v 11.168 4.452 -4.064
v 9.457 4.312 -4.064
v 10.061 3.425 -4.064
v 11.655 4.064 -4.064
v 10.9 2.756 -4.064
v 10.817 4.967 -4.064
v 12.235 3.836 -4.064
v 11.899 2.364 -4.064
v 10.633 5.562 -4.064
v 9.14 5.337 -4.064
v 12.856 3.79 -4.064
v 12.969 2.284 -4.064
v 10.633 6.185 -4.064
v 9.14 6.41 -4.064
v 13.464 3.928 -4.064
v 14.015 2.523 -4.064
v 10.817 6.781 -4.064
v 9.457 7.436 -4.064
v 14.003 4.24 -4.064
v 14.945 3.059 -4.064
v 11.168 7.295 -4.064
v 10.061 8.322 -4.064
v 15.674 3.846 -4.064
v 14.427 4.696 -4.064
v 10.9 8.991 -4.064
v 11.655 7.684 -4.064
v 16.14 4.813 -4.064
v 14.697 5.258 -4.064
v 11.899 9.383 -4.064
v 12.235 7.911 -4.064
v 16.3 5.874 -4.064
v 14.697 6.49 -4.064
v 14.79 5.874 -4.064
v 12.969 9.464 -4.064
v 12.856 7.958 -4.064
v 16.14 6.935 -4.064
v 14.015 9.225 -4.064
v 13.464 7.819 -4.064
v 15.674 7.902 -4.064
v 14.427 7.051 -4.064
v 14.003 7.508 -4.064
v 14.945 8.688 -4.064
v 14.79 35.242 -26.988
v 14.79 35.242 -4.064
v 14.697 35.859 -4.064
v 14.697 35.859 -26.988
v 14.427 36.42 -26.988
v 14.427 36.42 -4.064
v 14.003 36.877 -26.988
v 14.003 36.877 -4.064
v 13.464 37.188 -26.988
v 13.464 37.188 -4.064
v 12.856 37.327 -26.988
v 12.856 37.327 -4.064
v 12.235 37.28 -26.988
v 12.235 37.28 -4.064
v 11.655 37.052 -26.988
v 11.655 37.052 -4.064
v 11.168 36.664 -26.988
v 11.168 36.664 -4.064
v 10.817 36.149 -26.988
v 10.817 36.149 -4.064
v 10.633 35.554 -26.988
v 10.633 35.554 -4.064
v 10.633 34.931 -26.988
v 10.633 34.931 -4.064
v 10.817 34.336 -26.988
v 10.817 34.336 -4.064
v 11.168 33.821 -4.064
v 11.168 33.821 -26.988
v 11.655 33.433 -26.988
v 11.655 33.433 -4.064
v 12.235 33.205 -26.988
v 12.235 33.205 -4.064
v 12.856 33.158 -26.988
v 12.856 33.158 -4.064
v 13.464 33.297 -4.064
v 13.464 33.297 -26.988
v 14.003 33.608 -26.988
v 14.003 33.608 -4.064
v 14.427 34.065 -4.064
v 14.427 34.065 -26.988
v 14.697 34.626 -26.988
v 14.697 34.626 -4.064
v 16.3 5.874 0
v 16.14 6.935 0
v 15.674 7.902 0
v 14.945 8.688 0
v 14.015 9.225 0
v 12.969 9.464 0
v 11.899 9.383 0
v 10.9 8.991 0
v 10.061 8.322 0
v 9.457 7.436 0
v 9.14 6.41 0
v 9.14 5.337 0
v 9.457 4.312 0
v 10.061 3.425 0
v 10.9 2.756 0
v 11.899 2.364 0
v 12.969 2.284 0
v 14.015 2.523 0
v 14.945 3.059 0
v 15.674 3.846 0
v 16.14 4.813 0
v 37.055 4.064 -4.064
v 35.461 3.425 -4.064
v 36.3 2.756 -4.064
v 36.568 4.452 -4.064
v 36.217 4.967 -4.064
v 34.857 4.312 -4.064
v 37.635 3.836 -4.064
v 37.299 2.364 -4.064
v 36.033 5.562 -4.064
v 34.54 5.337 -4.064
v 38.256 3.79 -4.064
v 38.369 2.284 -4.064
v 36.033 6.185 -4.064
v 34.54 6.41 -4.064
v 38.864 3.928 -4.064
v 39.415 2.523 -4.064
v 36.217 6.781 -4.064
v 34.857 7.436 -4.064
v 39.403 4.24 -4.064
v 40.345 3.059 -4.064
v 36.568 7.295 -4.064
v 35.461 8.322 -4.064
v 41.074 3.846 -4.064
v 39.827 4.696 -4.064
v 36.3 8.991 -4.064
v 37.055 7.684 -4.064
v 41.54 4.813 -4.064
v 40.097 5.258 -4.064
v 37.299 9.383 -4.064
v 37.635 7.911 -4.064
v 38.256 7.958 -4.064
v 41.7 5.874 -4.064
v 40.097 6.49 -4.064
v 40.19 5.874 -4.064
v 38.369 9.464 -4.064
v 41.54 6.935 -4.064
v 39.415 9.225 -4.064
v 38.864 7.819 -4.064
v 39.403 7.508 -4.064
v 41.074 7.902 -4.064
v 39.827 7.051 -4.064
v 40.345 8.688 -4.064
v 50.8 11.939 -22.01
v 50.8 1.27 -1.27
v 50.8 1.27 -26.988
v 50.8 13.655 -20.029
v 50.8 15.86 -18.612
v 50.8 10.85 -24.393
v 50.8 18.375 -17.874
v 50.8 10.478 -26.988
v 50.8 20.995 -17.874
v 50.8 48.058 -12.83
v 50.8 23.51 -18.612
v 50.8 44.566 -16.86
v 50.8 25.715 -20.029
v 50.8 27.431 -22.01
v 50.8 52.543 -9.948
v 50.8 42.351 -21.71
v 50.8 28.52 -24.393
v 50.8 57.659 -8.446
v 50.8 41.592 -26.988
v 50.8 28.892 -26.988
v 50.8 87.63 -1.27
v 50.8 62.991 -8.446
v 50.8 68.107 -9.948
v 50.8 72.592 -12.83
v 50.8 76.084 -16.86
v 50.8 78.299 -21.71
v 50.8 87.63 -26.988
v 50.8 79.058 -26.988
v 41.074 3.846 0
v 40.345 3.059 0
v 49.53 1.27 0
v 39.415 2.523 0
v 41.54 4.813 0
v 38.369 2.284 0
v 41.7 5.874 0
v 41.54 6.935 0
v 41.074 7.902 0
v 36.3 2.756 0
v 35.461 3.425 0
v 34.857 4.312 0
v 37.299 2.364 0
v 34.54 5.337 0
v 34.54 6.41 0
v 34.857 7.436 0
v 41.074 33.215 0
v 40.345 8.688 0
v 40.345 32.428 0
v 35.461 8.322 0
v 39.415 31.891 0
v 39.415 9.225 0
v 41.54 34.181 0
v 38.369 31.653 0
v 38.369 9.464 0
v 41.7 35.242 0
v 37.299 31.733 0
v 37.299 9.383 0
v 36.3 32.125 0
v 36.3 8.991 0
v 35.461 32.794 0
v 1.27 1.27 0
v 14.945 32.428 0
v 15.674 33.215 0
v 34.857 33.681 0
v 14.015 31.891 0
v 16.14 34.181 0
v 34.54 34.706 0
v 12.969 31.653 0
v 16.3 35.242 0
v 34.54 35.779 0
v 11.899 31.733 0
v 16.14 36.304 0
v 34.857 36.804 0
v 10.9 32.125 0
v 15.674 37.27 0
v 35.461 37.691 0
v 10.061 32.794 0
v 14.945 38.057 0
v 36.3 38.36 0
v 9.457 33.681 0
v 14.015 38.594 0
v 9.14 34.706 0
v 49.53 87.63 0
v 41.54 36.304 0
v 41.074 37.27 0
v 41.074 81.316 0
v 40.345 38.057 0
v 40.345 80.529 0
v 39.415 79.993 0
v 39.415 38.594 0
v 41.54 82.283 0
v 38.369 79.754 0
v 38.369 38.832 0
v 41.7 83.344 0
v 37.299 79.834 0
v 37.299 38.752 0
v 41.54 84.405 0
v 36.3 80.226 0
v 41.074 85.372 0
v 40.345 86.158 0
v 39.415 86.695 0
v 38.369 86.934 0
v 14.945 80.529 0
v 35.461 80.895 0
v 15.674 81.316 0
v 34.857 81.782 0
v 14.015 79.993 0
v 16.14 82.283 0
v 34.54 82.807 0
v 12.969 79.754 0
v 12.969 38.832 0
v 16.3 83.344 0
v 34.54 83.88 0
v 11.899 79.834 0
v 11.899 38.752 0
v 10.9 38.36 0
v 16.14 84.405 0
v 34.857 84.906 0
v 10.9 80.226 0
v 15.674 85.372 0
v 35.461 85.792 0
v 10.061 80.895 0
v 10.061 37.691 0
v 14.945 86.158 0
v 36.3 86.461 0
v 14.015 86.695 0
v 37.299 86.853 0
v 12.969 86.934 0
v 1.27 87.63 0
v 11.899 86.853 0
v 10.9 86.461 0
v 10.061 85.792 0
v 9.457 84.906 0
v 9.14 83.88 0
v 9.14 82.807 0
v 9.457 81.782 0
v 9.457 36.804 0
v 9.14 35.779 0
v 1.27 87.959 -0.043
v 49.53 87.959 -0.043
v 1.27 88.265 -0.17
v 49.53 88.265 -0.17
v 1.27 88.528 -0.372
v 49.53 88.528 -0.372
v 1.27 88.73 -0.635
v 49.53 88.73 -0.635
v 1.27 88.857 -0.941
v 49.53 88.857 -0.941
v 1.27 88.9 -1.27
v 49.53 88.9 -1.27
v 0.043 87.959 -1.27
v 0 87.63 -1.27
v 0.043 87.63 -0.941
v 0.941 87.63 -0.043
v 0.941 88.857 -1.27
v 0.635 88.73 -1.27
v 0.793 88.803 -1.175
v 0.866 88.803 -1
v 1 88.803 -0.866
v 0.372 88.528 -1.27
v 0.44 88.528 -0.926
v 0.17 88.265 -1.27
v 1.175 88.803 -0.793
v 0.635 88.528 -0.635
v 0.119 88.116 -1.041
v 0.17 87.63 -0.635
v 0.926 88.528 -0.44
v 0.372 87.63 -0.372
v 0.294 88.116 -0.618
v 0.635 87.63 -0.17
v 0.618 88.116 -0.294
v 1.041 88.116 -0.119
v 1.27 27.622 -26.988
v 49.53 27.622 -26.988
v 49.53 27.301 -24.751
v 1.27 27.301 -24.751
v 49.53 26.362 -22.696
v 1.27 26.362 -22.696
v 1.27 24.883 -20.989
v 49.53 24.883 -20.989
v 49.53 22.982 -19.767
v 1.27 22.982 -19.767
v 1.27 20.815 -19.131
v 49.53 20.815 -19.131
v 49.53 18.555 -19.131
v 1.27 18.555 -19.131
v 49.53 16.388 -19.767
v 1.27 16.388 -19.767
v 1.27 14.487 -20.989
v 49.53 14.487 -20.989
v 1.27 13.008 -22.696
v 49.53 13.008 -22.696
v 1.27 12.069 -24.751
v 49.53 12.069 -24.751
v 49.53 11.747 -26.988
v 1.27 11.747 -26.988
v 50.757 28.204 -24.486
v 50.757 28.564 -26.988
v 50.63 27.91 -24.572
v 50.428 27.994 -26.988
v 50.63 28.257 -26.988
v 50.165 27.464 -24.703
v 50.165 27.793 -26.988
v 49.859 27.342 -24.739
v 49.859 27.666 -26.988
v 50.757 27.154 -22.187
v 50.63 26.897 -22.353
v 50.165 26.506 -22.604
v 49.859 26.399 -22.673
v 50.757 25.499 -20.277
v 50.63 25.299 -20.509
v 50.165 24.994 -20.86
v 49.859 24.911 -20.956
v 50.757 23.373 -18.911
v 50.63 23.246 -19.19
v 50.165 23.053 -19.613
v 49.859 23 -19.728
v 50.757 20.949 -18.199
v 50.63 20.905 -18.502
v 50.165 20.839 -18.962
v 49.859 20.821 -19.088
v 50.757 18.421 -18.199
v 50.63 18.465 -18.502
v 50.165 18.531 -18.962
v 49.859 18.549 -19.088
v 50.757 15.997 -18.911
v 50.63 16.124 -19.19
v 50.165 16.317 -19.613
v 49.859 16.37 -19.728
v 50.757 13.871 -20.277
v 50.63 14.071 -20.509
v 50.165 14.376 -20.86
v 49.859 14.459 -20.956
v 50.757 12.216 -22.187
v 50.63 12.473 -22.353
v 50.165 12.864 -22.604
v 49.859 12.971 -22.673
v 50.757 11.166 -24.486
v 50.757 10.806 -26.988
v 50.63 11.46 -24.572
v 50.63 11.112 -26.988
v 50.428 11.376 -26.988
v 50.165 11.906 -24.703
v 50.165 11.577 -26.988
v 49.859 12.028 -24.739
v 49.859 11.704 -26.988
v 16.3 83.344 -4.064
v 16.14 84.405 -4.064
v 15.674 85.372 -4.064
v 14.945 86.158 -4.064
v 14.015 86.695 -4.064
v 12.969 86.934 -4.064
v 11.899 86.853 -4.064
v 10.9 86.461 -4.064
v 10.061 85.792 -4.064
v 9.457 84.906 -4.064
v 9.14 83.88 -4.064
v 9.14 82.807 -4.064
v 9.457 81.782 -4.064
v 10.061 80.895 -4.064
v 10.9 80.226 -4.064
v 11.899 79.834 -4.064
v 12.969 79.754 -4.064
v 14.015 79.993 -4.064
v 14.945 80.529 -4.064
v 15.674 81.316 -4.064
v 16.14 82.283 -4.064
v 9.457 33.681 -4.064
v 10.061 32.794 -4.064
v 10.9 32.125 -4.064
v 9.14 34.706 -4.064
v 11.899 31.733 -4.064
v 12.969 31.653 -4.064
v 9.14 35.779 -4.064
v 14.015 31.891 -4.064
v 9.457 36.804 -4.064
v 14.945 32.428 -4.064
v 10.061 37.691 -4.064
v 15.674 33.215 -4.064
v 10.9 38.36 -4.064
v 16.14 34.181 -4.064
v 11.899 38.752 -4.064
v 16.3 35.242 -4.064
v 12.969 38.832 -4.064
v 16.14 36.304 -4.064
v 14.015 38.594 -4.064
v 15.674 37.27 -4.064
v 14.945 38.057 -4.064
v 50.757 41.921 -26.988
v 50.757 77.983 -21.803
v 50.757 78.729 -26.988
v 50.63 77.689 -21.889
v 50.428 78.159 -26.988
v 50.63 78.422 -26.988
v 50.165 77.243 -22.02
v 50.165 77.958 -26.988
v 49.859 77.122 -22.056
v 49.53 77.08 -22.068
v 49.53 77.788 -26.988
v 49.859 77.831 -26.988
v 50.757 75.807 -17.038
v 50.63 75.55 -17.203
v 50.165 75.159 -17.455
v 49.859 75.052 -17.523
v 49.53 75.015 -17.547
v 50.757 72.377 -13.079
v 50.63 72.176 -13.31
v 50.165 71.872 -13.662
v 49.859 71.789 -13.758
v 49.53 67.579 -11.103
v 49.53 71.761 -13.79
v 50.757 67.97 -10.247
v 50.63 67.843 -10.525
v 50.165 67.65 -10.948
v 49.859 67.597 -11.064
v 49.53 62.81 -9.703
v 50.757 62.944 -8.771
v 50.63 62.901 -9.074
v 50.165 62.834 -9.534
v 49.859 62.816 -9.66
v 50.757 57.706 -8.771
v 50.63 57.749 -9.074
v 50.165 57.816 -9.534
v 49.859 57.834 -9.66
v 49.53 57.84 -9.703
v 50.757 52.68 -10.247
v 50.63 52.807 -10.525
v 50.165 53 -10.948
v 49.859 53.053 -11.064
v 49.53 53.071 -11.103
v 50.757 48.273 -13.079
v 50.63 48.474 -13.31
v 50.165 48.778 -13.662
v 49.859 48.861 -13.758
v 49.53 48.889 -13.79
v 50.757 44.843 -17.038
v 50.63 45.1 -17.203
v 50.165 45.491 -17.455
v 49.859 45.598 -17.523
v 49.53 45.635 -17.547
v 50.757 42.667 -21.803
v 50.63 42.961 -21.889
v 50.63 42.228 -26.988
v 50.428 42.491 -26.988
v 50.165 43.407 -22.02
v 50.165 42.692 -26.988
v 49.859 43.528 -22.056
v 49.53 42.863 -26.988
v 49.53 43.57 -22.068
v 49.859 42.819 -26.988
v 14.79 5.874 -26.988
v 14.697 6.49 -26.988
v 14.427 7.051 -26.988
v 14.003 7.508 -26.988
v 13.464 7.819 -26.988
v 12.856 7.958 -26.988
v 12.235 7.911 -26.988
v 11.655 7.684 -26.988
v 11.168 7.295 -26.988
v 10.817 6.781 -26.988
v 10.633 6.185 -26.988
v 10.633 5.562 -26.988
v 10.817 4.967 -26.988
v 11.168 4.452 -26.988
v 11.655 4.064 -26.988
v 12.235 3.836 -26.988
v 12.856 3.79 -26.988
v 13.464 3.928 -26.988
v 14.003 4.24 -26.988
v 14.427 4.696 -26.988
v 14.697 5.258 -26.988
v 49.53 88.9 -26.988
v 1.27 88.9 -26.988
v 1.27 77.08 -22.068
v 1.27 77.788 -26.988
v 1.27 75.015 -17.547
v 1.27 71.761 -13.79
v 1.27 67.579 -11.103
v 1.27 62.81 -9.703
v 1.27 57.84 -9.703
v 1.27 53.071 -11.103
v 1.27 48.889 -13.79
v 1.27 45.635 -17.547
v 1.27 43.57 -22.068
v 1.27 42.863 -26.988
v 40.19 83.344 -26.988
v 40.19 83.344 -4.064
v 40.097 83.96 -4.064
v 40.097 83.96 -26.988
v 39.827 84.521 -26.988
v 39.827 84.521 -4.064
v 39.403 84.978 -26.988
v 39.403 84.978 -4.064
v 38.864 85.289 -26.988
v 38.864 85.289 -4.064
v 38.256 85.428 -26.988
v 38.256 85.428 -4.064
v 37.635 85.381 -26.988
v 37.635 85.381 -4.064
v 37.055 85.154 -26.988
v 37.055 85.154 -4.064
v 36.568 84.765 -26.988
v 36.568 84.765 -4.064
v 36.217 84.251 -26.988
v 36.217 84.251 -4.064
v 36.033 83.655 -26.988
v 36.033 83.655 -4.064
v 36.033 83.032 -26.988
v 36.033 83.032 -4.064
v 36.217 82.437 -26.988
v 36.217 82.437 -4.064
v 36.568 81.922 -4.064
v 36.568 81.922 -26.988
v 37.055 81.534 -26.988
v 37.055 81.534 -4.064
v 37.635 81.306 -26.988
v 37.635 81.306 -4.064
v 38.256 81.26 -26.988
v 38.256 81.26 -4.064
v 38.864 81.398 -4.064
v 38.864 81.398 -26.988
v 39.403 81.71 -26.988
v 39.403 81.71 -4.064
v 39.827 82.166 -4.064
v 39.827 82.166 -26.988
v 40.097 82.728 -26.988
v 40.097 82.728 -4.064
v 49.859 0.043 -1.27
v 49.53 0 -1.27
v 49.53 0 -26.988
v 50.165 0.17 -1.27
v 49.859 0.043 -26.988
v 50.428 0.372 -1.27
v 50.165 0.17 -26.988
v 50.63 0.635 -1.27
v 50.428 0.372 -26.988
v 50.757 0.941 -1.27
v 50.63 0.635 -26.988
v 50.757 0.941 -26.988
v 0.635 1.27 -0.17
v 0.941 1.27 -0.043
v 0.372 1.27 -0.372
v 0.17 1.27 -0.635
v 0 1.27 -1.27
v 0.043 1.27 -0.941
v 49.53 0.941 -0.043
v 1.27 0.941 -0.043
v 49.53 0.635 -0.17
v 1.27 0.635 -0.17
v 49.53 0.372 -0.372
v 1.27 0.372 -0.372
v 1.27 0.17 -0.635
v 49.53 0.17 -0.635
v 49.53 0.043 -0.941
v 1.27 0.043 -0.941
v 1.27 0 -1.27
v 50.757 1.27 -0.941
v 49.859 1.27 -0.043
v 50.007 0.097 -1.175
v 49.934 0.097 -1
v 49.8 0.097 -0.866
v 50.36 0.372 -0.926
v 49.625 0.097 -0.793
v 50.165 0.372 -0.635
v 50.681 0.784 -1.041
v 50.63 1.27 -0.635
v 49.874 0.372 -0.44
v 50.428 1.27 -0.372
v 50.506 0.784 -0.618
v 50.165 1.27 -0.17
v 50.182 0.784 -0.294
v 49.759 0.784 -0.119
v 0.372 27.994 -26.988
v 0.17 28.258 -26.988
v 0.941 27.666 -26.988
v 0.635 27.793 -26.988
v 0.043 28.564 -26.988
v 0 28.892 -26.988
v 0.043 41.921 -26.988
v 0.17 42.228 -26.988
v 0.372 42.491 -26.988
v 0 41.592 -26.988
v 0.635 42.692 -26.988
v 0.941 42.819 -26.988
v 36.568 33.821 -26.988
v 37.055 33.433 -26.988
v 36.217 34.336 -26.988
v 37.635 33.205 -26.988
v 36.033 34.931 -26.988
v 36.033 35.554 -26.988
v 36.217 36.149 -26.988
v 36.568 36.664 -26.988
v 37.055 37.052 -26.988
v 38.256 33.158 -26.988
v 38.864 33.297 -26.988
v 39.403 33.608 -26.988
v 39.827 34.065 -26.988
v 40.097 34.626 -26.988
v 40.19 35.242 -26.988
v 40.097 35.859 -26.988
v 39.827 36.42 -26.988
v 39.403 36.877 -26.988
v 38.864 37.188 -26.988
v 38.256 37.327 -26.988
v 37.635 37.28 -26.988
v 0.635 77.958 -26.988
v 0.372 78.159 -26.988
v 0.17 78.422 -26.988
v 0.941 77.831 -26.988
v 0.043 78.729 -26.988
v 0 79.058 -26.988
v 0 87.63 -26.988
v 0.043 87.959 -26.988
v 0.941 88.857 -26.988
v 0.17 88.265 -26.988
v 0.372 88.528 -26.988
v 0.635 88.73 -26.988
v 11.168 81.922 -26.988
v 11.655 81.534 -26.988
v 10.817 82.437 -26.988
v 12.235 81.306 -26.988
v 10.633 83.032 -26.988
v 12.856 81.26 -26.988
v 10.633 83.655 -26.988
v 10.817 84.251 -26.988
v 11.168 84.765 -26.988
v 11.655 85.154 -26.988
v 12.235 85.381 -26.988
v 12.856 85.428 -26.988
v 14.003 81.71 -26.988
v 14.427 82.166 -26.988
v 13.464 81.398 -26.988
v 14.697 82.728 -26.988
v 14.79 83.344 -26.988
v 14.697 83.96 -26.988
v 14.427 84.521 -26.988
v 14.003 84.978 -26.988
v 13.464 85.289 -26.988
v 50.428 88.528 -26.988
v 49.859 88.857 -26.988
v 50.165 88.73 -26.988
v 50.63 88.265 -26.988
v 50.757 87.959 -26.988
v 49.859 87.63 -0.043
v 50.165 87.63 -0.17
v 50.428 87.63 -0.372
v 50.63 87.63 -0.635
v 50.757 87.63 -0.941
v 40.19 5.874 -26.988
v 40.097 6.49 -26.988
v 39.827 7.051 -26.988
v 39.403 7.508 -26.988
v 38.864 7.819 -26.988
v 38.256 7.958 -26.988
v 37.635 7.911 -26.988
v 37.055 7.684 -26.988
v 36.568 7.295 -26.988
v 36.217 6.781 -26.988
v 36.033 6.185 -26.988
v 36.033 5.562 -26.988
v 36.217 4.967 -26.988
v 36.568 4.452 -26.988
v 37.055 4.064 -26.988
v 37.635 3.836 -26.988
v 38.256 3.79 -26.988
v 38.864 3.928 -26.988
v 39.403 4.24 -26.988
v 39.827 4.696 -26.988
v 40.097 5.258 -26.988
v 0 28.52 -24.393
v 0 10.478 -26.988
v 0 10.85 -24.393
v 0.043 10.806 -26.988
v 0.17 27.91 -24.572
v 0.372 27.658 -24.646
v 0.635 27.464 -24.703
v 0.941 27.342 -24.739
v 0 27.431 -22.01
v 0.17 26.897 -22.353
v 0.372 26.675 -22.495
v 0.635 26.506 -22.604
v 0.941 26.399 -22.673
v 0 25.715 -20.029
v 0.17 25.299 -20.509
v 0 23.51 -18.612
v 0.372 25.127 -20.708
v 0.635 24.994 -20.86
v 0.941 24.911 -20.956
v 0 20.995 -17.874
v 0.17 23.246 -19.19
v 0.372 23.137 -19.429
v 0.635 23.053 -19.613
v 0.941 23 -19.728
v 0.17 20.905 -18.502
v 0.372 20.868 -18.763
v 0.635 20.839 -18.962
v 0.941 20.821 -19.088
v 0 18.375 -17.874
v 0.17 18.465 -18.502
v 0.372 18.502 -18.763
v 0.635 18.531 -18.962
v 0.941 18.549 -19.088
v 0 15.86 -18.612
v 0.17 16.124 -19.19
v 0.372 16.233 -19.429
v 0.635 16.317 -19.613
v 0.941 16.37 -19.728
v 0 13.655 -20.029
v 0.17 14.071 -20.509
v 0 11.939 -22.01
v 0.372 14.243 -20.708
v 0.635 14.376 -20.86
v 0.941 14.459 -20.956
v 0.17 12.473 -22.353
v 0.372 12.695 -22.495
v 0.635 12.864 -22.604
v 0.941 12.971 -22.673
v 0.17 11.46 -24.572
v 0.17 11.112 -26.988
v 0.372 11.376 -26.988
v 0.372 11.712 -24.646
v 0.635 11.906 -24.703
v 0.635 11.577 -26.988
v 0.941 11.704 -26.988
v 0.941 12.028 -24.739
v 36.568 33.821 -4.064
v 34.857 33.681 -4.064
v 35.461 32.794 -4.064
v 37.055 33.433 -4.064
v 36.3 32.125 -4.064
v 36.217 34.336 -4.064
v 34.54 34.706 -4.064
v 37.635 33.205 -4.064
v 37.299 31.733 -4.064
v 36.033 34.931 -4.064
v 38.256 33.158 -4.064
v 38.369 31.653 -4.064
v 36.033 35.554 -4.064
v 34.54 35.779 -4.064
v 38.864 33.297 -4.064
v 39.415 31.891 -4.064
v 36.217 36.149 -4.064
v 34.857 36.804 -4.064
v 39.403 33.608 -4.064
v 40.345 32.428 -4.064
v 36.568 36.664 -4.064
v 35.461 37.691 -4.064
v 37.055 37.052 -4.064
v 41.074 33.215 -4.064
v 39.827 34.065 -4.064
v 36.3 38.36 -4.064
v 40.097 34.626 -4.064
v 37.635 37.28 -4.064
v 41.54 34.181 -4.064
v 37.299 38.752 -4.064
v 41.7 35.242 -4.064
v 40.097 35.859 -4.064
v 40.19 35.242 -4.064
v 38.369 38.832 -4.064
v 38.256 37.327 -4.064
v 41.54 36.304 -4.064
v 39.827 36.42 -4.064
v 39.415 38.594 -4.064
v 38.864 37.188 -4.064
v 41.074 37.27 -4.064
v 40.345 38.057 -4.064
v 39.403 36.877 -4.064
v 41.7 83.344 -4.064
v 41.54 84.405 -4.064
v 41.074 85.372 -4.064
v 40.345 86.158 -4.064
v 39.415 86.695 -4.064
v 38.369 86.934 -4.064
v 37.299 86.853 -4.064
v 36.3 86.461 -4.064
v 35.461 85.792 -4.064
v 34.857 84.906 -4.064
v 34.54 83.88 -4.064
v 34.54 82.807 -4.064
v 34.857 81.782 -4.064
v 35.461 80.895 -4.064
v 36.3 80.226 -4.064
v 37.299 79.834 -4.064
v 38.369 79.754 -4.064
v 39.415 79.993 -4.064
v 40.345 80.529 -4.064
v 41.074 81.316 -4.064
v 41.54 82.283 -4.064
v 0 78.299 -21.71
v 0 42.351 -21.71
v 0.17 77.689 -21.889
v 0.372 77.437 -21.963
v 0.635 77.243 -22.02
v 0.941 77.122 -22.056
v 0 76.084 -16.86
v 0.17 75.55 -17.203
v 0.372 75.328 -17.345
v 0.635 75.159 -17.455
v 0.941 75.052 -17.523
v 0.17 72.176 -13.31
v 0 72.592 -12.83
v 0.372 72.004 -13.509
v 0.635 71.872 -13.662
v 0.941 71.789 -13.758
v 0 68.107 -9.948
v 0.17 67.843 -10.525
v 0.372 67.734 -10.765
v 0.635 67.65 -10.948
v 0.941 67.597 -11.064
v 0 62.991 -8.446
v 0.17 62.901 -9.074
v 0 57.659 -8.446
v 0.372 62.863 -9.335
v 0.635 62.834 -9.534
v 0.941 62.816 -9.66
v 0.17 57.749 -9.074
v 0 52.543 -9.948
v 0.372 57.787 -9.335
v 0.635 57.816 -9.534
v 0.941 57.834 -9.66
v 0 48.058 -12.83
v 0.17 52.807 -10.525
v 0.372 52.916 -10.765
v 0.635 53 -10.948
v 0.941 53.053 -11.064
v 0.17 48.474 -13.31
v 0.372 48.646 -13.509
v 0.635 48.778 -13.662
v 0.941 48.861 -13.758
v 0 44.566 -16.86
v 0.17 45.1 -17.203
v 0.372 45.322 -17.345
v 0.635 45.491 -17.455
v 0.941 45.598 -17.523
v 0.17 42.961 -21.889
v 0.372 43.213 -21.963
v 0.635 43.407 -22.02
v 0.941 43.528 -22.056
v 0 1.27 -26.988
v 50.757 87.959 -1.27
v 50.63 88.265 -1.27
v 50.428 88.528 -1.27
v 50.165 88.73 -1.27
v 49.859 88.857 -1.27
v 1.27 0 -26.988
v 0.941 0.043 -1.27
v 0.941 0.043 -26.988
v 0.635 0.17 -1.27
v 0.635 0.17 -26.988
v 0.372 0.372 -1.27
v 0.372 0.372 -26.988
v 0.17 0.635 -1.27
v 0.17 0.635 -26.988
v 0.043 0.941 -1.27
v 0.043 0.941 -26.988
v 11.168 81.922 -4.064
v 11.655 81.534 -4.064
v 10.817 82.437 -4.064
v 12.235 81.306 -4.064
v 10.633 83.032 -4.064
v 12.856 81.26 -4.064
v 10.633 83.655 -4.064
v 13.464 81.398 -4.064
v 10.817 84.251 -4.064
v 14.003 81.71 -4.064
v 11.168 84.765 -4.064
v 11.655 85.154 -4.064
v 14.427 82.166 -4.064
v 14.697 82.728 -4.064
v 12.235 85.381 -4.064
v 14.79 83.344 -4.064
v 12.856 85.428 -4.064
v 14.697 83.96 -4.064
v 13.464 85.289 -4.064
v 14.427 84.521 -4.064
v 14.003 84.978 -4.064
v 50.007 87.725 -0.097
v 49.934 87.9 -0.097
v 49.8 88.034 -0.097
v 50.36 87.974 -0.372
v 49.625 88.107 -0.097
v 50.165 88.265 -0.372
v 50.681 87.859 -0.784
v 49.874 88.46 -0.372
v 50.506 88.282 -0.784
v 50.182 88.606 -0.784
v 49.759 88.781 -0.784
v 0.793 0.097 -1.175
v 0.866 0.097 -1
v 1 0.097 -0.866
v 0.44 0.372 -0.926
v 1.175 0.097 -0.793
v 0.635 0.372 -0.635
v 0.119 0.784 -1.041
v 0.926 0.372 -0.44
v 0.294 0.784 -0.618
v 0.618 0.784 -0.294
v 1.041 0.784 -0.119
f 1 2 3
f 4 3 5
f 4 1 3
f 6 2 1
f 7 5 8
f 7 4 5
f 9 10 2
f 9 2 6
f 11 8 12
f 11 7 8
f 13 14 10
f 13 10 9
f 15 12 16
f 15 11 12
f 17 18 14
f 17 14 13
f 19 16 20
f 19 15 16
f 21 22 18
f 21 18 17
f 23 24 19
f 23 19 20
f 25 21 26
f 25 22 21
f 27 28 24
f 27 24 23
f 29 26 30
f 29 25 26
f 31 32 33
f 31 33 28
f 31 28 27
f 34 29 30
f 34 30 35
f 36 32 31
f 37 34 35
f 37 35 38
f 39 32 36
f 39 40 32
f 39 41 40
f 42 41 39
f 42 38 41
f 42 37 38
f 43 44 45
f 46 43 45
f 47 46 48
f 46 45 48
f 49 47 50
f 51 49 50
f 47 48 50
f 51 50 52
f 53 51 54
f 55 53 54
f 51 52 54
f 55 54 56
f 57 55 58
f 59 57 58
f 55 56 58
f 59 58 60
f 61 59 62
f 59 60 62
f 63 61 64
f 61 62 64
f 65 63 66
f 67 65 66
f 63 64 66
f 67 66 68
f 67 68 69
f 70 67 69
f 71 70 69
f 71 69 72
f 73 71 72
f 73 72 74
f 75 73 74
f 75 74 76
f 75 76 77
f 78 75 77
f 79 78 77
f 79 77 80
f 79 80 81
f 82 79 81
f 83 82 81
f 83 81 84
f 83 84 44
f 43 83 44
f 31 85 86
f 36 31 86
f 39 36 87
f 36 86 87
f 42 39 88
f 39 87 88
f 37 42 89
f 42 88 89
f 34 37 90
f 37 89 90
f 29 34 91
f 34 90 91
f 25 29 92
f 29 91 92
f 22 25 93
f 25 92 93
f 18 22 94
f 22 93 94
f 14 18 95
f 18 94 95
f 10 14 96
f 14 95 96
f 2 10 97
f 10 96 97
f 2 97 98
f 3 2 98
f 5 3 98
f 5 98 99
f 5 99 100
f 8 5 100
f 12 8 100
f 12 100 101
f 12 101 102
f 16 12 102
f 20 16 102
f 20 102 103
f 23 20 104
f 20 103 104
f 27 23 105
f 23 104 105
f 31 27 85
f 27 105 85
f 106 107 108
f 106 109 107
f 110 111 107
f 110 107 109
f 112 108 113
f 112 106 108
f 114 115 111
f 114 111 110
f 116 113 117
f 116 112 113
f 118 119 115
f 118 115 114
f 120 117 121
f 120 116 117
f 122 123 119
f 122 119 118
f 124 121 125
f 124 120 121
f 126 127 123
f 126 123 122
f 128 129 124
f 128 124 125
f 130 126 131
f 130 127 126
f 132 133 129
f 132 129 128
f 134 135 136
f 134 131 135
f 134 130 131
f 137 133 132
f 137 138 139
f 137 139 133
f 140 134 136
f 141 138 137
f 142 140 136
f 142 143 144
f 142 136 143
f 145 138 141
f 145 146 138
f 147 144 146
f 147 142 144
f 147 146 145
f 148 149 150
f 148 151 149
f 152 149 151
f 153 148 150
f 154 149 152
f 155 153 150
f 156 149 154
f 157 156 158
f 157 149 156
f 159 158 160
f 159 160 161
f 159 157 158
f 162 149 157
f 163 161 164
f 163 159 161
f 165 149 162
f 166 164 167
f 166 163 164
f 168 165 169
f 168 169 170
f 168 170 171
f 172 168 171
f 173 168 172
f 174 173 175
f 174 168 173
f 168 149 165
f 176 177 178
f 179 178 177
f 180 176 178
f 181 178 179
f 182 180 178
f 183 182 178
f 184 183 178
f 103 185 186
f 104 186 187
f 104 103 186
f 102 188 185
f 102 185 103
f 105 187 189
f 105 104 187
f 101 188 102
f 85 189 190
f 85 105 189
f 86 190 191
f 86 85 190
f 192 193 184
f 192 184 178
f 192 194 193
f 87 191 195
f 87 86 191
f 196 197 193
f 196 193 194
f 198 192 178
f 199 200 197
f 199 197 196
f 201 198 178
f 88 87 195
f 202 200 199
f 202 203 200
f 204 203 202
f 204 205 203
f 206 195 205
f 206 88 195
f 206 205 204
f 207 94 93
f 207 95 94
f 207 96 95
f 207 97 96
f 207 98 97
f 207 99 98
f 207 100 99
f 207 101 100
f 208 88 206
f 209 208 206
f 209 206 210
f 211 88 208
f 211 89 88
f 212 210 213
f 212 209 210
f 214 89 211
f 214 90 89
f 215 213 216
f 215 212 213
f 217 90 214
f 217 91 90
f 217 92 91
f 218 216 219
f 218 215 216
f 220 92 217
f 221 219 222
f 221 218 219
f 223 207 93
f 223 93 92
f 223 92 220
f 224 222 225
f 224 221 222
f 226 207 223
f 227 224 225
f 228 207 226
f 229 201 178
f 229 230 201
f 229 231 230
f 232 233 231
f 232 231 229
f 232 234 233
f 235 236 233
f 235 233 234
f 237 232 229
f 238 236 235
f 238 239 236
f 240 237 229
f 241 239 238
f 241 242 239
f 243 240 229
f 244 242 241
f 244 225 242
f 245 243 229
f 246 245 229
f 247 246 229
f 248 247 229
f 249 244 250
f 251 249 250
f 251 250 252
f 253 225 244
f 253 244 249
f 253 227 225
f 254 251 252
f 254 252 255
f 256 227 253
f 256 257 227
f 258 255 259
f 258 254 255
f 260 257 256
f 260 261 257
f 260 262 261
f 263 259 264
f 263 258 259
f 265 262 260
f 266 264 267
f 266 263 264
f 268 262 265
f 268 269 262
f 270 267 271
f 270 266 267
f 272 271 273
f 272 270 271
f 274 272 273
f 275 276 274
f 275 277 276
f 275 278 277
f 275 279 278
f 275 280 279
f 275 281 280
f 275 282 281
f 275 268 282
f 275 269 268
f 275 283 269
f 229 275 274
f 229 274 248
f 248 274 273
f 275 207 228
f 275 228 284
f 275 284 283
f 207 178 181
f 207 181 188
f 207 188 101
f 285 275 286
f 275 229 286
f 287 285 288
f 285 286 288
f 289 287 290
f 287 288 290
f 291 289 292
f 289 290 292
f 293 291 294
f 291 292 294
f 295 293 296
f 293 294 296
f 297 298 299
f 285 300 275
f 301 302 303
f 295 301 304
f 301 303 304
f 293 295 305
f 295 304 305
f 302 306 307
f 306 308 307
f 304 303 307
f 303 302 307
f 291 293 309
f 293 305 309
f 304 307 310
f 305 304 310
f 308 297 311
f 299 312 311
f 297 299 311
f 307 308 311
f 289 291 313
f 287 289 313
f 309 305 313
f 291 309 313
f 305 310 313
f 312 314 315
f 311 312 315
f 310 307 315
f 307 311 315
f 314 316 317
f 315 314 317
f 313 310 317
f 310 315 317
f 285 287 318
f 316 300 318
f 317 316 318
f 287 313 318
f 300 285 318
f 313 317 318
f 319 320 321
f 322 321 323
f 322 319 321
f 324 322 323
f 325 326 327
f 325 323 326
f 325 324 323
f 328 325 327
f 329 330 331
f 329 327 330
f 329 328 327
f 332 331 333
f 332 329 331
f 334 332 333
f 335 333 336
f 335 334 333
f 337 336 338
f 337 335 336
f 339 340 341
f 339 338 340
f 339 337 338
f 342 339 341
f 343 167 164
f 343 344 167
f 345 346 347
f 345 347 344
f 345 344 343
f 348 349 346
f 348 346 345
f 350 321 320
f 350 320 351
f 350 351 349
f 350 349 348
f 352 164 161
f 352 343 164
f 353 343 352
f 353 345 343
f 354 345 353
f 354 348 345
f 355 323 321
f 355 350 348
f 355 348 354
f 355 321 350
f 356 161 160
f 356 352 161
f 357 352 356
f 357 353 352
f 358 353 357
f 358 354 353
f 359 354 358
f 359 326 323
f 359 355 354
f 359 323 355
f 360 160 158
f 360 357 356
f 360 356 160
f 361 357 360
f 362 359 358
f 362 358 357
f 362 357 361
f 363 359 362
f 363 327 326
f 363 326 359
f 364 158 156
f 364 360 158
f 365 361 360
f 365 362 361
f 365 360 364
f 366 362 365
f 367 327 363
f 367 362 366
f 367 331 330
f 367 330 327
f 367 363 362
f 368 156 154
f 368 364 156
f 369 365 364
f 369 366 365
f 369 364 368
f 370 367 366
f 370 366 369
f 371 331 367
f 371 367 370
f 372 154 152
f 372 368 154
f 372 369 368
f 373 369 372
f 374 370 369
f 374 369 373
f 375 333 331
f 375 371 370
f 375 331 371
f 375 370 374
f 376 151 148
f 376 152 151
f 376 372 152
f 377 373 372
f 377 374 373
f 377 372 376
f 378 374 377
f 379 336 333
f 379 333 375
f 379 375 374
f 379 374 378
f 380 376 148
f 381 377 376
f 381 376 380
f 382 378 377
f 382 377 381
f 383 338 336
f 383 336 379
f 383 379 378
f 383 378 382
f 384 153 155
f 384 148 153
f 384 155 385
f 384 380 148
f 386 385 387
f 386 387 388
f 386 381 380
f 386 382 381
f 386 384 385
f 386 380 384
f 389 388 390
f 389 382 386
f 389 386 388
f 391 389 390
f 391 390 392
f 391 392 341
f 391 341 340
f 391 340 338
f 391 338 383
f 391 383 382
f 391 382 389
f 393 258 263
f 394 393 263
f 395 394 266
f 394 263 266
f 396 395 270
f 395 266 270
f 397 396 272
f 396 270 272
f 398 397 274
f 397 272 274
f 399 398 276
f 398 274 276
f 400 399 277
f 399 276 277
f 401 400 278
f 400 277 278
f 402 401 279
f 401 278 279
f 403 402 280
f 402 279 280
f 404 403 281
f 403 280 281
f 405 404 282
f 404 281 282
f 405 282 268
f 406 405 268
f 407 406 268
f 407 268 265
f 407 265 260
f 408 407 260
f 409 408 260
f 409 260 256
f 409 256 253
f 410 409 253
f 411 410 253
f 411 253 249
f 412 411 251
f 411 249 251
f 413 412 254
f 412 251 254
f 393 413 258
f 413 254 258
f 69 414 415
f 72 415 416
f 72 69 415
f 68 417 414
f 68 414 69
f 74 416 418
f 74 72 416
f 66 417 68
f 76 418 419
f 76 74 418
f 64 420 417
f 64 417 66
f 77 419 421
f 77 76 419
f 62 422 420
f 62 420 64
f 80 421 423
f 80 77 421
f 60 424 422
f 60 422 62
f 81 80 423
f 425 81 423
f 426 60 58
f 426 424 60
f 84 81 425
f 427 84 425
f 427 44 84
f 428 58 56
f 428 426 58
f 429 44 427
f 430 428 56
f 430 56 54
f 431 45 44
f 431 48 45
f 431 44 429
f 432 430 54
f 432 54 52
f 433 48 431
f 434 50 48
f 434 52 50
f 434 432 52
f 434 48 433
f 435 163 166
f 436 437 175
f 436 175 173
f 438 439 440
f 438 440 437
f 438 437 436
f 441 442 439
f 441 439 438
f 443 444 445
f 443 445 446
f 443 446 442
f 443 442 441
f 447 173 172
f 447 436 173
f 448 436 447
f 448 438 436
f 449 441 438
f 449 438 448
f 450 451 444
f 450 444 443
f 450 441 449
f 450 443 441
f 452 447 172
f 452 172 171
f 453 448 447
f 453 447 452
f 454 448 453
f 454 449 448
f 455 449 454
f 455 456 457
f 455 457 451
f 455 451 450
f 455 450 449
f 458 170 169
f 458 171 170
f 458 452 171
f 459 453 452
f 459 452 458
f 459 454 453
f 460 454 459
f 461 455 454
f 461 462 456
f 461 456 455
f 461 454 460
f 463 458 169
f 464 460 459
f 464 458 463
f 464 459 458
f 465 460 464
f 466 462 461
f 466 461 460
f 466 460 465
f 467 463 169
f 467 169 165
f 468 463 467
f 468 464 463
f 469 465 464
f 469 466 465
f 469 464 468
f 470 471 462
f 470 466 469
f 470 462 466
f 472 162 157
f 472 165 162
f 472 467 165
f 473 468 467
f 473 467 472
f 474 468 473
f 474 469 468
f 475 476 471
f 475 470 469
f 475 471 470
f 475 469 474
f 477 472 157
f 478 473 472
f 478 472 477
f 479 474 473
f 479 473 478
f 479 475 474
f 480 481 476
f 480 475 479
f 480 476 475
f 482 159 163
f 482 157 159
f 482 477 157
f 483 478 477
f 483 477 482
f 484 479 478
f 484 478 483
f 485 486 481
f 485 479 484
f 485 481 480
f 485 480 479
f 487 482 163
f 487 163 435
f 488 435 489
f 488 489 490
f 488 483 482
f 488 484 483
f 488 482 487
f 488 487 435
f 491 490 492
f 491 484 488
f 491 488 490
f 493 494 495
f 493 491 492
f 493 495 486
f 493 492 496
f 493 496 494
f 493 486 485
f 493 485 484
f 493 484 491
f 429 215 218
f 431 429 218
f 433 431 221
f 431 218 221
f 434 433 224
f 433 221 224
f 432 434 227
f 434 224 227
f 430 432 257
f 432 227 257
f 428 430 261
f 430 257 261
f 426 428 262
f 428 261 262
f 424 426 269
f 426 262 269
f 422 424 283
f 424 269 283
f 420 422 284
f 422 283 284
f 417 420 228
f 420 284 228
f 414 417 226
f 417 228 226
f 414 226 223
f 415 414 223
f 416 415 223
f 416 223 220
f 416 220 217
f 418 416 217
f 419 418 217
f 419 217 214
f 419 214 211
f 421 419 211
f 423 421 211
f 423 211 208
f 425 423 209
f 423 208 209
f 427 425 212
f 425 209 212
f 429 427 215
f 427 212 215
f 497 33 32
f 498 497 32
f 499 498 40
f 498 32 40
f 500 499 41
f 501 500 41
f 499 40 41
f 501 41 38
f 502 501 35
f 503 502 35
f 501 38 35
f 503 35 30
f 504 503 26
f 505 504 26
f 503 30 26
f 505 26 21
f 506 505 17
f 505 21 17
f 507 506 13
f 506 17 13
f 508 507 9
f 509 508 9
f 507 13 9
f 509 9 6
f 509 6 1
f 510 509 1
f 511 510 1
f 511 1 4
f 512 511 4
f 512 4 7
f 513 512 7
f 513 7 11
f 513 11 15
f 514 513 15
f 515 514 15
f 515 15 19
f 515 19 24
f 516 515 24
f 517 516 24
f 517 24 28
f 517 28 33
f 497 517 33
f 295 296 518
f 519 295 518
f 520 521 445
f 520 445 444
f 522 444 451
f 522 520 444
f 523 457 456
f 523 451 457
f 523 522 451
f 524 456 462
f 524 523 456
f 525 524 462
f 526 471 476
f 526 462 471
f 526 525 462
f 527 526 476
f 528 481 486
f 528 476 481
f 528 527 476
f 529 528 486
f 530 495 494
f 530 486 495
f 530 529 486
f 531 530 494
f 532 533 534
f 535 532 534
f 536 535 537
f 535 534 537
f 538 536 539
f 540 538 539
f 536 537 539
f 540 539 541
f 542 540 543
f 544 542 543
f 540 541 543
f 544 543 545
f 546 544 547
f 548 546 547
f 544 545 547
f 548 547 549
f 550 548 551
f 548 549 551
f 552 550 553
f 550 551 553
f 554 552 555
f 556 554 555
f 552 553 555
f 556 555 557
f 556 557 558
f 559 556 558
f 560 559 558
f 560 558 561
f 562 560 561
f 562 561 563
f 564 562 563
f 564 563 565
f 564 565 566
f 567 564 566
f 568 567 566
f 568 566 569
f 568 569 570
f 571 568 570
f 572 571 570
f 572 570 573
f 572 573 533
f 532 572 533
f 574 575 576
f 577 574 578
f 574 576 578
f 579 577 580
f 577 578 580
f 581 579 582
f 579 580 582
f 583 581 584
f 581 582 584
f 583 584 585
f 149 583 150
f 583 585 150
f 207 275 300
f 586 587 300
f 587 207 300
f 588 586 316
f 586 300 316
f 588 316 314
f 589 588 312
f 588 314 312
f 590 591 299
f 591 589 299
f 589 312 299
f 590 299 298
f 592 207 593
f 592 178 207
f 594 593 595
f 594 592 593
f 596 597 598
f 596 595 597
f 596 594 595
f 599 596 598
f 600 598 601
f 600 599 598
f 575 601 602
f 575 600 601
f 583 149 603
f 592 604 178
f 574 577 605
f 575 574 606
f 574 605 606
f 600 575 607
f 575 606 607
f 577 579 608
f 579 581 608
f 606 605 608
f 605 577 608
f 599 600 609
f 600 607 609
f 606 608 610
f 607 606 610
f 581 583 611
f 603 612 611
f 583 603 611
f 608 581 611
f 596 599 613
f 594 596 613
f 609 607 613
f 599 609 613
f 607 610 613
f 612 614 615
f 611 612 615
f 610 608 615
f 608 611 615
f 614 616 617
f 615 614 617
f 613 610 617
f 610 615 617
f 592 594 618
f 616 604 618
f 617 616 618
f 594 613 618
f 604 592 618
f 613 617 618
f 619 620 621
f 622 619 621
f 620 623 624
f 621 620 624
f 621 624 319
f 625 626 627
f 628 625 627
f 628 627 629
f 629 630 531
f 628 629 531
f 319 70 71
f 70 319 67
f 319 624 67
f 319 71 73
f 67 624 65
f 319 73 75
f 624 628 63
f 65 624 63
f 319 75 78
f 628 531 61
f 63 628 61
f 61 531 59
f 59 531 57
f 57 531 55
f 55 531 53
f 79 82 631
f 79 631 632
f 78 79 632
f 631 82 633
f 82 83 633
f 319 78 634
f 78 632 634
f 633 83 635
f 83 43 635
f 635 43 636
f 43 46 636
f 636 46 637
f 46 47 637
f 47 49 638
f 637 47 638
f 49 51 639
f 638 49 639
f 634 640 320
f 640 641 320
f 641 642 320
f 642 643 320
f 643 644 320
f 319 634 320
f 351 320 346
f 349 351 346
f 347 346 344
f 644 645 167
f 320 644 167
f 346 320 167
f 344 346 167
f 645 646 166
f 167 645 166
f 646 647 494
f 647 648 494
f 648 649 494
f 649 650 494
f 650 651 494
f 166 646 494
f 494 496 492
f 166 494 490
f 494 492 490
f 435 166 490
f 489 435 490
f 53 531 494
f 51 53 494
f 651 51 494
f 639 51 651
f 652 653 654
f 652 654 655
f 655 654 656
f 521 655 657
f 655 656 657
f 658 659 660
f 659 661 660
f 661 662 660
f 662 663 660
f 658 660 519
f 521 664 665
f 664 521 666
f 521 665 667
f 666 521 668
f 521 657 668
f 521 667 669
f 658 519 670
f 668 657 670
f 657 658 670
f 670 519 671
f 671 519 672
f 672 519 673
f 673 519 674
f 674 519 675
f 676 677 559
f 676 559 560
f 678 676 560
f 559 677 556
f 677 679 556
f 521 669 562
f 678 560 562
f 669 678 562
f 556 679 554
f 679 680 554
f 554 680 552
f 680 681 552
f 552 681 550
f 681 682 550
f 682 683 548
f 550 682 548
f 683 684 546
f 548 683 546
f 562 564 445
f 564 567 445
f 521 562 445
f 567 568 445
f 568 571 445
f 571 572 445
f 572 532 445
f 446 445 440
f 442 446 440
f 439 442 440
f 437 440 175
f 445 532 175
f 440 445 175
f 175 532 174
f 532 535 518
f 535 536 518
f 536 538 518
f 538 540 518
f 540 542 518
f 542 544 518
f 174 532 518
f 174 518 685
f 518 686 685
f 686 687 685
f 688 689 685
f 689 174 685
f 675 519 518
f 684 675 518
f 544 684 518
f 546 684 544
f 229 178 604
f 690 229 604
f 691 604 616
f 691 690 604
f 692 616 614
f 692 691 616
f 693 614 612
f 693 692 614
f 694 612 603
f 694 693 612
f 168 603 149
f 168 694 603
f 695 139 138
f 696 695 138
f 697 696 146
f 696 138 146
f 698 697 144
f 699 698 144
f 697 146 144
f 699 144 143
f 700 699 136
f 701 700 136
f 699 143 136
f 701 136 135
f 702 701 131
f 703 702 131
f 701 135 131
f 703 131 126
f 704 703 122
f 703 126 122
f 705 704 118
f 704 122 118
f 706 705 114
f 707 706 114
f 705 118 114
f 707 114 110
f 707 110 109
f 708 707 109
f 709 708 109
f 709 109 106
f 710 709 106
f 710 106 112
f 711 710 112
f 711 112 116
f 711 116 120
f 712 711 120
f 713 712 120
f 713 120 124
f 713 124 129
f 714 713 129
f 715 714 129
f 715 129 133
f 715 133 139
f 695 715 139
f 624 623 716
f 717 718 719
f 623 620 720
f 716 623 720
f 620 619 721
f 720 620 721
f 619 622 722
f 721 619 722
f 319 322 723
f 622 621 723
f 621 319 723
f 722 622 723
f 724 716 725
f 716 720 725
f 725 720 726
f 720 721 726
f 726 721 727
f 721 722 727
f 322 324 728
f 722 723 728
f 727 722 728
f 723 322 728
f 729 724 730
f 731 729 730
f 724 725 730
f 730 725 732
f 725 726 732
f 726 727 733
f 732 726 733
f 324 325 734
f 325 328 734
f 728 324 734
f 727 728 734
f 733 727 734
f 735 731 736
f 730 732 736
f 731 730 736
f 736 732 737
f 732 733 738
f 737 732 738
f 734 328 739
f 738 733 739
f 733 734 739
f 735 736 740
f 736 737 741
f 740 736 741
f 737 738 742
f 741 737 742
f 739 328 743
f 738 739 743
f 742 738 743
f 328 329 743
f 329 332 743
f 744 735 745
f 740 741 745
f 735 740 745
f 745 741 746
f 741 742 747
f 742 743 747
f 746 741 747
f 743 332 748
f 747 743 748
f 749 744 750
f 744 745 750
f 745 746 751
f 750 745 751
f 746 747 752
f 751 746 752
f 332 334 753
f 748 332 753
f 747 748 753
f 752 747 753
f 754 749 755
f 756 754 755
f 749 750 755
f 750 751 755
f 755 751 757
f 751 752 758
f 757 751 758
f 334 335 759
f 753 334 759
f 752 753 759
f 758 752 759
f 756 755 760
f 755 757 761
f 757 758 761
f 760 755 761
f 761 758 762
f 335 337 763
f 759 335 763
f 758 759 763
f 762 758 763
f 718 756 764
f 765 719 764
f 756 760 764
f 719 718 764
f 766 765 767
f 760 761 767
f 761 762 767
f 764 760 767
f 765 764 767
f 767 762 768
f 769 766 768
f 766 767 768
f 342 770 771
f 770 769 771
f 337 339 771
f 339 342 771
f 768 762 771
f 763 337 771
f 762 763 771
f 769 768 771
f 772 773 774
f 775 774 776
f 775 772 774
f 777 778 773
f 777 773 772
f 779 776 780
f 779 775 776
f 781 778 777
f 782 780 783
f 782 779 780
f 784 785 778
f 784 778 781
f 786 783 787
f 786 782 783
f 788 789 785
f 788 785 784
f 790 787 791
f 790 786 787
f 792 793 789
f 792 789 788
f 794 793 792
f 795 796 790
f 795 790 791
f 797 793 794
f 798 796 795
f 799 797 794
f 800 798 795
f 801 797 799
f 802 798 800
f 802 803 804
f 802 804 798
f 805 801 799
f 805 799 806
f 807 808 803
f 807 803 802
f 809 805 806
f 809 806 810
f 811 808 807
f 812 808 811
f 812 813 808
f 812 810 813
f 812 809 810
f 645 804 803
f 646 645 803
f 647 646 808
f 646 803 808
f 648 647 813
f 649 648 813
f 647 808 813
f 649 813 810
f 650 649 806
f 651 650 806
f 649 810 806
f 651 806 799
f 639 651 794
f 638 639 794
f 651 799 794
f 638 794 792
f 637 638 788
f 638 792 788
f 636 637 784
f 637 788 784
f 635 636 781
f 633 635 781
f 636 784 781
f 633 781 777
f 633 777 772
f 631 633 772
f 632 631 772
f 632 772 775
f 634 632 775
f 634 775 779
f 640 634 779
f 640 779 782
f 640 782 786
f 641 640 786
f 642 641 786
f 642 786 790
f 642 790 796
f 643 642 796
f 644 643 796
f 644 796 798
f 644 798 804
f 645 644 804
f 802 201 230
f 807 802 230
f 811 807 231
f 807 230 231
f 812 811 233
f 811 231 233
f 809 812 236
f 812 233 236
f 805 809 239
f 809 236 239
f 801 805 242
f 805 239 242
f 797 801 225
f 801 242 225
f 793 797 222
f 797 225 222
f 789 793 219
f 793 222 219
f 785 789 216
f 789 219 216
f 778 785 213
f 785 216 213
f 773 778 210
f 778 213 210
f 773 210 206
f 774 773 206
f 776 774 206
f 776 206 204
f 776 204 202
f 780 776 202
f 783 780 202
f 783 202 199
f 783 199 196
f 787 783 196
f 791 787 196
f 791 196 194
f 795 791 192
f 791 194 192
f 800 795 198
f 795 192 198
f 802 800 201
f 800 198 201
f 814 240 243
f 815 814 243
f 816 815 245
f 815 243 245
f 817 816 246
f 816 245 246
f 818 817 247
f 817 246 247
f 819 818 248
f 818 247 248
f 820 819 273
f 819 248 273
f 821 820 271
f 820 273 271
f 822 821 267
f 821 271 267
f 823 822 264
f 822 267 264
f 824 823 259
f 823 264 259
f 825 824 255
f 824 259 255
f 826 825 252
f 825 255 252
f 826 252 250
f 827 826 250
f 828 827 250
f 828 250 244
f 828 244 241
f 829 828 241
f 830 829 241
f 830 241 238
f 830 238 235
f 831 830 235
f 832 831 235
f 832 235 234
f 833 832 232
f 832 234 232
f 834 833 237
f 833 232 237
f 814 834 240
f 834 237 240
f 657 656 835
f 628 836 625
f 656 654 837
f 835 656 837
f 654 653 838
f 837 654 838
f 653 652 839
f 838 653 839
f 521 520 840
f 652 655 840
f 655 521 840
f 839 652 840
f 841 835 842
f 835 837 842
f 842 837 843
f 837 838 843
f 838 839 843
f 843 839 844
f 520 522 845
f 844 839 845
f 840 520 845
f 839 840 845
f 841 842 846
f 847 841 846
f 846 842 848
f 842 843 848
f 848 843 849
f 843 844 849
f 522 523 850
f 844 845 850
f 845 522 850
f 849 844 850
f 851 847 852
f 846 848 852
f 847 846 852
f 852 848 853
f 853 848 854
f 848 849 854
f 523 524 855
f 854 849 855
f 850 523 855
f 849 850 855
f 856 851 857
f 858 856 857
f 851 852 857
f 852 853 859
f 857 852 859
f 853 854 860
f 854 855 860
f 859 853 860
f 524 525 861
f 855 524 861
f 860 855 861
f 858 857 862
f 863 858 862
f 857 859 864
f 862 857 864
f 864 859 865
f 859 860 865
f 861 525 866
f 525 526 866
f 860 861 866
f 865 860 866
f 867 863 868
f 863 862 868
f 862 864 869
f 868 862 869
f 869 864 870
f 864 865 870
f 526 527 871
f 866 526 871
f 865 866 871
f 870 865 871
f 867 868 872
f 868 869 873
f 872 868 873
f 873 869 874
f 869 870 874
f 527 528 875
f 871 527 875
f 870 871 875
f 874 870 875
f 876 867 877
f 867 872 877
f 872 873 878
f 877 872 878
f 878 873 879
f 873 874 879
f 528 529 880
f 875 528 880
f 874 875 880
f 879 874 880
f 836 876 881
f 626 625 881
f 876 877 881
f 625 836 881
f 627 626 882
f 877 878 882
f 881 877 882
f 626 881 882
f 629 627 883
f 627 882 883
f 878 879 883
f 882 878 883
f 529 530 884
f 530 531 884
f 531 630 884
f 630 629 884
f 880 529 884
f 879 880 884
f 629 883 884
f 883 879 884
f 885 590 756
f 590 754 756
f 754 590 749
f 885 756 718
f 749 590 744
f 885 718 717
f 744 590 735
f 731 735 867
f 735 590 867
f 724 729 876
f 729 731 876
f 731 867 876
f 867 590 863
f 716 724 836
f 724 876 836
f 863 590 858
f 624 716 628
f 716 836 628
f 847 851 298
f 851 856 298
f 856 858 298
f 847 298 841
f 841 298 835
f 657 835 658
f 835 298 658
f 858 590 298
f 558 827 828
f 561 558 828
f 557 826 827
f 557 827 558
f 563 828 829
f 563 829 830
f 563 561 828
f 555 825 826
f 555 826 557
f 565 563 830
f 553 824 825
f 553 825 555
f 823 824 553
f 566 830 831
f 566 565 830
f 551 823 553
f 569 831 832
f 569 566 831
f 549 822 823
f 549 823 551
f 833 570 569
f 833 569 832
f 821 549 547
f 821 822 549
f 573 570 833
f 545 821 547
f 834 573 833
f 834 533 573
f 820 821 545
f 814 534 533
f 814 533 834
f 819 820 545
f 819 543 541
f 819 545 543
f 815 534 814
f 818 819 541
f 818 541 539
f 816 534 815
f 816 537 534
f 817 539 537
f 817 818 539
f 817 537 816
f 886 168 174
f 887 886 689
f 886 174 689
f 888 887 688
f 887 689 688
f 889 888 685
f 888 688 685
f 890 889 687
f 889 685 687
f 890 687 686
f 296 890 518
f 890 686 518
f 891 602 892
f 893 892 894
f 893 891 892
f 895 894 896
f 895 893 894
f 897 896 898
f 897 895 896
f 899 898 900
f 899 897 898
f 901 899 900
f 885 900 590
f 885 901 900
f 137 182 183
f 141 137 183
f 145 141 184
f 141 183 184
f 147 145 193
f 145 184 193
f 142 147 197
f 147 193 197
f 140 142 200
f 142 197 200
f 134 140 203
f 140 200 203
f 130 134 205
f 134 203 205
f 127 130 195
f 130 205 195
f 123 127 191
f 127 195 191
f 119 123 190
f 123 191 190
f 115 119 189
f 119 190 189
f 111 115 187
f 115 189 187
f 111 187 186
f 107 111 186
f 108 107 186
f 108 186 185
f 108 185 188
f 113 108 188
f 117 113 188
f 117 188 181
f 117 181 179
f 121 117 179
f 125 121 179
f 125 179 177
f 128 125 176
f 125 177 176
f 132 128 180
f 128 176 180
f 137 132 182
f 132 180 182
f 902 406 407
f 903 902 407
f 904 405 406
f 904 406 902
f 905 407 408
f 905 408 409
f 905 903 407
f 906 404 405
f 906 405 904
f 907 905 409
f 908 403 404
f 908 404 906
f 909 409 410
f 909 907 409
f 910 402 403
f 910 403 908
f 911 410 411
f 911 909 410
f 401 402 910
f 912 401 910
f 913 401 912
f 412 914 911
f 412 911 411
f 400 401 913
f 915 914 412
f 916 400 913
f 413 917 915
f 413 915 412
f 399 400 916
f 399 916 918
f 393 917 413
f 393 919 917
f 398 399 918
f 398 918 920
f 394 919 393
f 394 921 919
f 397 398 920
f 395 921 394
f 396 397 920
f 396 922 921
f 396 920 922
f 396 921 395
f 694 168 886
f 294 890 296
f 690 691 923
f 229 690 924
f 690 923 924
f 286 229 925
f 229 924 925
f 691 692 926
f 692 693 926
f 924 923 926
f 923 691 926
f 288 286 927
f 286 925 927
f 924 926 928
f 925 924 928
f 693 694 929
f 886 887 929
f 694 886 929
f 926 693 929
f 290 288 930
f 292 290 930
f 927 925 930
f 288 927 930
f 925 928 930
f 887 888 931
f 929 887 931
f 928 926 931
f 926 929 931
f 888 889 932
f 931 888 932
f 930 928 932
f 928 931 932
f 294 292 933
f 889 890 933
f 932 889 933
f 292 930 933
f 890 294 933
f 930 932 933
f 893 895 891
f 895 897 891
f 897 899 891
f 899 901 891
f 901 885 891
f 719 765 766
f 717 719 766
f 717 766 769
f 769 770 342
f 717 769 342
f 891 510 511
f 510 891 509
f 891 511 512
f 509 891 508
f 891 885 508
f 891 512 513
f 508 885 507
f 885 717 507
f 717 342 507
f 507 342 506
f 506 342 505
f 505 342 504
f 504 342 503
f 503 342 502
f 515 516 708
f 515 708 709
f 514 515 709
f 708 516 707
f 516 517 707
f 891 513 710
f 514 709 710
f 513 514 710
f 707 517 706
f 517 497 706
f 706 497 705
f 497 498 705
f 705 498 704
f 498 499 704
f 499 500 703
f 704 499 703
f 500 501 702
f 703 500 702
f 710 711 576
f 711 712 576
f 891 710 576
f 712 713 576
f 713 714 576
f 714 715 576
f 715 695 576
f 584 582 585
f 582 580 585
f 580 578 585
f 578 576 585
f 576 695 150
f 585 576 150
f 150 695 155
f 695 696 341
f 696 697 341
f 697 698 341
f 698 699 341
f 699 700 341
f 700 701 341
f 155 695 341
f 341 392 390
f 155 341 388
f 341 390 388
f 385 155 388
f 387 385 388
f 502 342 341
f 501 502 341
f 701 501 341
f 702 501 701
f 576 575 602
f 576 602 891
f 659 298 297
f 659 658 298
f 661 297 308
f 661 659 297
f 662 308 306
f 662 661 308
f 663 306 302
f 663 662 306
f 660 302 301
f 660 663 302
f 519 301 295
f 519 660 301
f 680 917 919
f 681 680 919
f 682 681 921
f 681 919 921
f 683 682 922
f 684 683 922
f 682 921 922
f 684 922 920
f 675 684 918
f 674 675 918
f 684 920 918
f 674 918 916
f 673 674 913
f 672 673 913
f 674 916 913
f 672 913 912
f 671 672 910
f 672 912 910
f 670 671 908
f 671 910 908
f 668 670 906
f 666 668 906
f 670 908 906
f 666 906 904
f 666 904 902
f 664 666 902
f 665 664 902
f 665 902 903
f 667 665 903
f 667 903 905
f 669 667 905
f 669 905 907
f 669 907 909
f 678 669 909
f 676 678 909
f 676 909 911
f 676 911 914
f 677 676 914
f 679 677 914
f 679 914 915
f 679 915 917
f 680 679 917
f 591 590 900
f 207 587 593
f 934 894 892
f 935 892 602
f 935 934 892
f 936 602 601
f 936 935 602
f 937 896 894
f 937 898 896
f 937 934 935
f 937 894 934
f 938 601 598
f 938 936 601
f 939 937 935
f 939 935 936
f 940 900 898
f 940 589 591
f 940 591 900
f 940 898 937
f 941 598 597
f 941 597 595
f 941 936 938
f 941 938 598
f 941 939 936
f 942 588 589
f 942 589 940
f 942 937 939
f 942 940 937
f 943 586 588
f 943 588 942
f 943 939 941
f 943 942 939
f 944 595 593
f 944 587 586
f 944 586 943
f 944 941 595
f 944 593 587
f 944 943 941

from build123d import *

# Parameters (mm, degrees)
SKETCH1_W           = 53.975
SKETCH1_H           = 88.9
SKETCH1_R           = 7.9375
SKETCH1_R_2         = 17.4625
BOSS_EXTRUDE1_DEPTH = 50.8
SKETCH5_R           = 2.09
CUT_EXTRUDE1_DEPTH  = 116.746060948
SKETCH5_3_R         = 3.6
CUT_EXTRUDE2_DEPTH  = 4.064
CUT_EXTRUDE3_DEPTH  = 2.54
FILLET1_R           = 1.27


with BuildPart() as part:
    # Sketch1 → Boss-Extrude1 (new body)
    with BuildSketch(Plane(origin=(0, 0, 0), x_dir=(0, 0, -1), z_dir=(1, 0, 0))):
        with Locations((26.9875, 44.45)):
            Rectangle(SKETCH1_W, SKETCH1_H)
        with Locations(Location((26.9875, 19.685, 0), (0, 0, 180))):
            Circle(SKETCH1_R, mode=Mode.SUBTRACT)
        with Locations(Location((26.9875, 60.325, 0), (0, 0, 180))):
            Circle(SKETCH1_R_2, mode=Mode.SUBTRACT)
    extrude(amount=BOSS_EXTRUDE1_DEPTH)

    # Sketch5 → Cut-Extrude1 (cut, through all)
    with BuildSketch(Plane.XY):
        with Locations((12.7, 83.34375)):
            Circle(SKETCH5_R)
        with Locations((12.7, 35.2425)):
            Circle(SKETCH5_R)
        with Locations((38.1, 83.34375)):
            Circle(SKETCH5_R)
        with Locations((38.1, 35.2425)):
            Circle(SKETCH5_R)
        with Locations((12.7, 5.87375)):
            Circle(SKETCH5_R)
        with Locations((38.1, 5.87375)):
            Circle(SKETCH5_R)
    extrude(amount=-CUT_EXTRUDE1_DEPTH, mode=Mode.SUBTRACT)

    # Sketch5<3> → Cut-Extrude2 (cut)
    with BuildSketch(Plane.XY):
        with Locations((38.1, 35.2425)):
            Circle(SKETCH5_3_R)
        with Locations((12.7, 83.34375)):
            Circle(SKETCH5_3_R)
        with Locations((38.1, 83.34375)):
            Circle(SKETCH5_3_R)
        with Locations((12.7, 35.2425)):
            Circle(SKETCH5_3_R)
        with Locations((38.1, 5.87375)):
            Circle(SKETCH5_3_R)
        with Locations((12.7, 5.87375)):
            Circle(SKETCH5_3_R)
    extrude(amount=-CUT_EXTRUDE2_DEPTH, mode=Mode.SUBTRACT)

    # Sketch6 → Cut-Extrude3 (cut)
    with BuildSketch(Plane(origin=(0, 0, -53.975), x_dir=(-1, 0, 0), z_dir=(0, 0, -1))):
        Polygon((-34.02855, 83.34375), (-36.064275, 86.86972913), (-40.135725, 86.86972913), (-42.17145, 83.34375), (-40.135725, 79.81777087), (-36.064275, 79.81777087), align=None)
        Polygon((-8.62855, 83.34375), (-10.664275, 86.86972913), (-14.735725, 86.86972913), (-16.77145, 83.34375), (-14.735725, 79.81777087), (-10.664275, 79.81777087), align=None)
        Polygon((-8.62855, 35.2425), (-10.664275, 38.76847913), (-14.735725, 38.76847913), (-16.77145, 35.2425), (-14.735725, 31.71652087), (-10.664275, 31.71652087), align=None)
        Polygon((-34.02855, 35.2425), (-36.064275, 38.76847913), (-40.135725, 38.76847913), (-42.17145, 35.2425), (-40.135725, 31.71652087), (-36.064275, 31.71652087), align=None)
        Polygon((-34.02855, 5.87375), (-36.064275, 9.39972913), (-40.135725, 9.39972913), (-42.17145, 5.87375), (-40.135725, 2.34777087), (-36.064275, 2.34777087), align=None)
        Polygon((-8.62855, 5.87375), (-10.664275, 9.39972913), (-14.735725, 9.39972913), (-16.77145, 5.87375), (-14.735725, 2.34777087), (-10.664275, 2.34777087), align=None)
    extrude(amount=-CUT_EXTRUDE3_DEPTH, mode=Mode.SUBTRACT)

    # Fillet1
    fillet1_edges = [part.edges().sort_by_distance(p)[0] for p in [
        (0, 60.325, -44.45),
        (50.8, 60.325, -44.45),
        (50.8, 88.9, -26.9875),
        (0, 19.685, -34.925),
        (50.8, 19.685, -34.925),
        (50.8, 44.45, 0),
        (50.8, 0, -26.9875),
        (0, 44.45, 0),
        (0, 88.9, -26.9875),
        (0, 44.45, -53.975),
        (0, 0, -26.9875),
        (25.4, 0, 0),
        (25.4, 88.9, 0),
        (25.4, 88.9, -53.975),
        (25.4, 0, -53.975),
        (50.8, 44.45, -53.975),
    ]]
    fillet(fillet1_edges, radius=FILLET1_R)

    # SurfaceCut1
    split(bisect_by=Plane.XY.offset(-26.9875), keep=Keep.TOP)


solid = part.part
